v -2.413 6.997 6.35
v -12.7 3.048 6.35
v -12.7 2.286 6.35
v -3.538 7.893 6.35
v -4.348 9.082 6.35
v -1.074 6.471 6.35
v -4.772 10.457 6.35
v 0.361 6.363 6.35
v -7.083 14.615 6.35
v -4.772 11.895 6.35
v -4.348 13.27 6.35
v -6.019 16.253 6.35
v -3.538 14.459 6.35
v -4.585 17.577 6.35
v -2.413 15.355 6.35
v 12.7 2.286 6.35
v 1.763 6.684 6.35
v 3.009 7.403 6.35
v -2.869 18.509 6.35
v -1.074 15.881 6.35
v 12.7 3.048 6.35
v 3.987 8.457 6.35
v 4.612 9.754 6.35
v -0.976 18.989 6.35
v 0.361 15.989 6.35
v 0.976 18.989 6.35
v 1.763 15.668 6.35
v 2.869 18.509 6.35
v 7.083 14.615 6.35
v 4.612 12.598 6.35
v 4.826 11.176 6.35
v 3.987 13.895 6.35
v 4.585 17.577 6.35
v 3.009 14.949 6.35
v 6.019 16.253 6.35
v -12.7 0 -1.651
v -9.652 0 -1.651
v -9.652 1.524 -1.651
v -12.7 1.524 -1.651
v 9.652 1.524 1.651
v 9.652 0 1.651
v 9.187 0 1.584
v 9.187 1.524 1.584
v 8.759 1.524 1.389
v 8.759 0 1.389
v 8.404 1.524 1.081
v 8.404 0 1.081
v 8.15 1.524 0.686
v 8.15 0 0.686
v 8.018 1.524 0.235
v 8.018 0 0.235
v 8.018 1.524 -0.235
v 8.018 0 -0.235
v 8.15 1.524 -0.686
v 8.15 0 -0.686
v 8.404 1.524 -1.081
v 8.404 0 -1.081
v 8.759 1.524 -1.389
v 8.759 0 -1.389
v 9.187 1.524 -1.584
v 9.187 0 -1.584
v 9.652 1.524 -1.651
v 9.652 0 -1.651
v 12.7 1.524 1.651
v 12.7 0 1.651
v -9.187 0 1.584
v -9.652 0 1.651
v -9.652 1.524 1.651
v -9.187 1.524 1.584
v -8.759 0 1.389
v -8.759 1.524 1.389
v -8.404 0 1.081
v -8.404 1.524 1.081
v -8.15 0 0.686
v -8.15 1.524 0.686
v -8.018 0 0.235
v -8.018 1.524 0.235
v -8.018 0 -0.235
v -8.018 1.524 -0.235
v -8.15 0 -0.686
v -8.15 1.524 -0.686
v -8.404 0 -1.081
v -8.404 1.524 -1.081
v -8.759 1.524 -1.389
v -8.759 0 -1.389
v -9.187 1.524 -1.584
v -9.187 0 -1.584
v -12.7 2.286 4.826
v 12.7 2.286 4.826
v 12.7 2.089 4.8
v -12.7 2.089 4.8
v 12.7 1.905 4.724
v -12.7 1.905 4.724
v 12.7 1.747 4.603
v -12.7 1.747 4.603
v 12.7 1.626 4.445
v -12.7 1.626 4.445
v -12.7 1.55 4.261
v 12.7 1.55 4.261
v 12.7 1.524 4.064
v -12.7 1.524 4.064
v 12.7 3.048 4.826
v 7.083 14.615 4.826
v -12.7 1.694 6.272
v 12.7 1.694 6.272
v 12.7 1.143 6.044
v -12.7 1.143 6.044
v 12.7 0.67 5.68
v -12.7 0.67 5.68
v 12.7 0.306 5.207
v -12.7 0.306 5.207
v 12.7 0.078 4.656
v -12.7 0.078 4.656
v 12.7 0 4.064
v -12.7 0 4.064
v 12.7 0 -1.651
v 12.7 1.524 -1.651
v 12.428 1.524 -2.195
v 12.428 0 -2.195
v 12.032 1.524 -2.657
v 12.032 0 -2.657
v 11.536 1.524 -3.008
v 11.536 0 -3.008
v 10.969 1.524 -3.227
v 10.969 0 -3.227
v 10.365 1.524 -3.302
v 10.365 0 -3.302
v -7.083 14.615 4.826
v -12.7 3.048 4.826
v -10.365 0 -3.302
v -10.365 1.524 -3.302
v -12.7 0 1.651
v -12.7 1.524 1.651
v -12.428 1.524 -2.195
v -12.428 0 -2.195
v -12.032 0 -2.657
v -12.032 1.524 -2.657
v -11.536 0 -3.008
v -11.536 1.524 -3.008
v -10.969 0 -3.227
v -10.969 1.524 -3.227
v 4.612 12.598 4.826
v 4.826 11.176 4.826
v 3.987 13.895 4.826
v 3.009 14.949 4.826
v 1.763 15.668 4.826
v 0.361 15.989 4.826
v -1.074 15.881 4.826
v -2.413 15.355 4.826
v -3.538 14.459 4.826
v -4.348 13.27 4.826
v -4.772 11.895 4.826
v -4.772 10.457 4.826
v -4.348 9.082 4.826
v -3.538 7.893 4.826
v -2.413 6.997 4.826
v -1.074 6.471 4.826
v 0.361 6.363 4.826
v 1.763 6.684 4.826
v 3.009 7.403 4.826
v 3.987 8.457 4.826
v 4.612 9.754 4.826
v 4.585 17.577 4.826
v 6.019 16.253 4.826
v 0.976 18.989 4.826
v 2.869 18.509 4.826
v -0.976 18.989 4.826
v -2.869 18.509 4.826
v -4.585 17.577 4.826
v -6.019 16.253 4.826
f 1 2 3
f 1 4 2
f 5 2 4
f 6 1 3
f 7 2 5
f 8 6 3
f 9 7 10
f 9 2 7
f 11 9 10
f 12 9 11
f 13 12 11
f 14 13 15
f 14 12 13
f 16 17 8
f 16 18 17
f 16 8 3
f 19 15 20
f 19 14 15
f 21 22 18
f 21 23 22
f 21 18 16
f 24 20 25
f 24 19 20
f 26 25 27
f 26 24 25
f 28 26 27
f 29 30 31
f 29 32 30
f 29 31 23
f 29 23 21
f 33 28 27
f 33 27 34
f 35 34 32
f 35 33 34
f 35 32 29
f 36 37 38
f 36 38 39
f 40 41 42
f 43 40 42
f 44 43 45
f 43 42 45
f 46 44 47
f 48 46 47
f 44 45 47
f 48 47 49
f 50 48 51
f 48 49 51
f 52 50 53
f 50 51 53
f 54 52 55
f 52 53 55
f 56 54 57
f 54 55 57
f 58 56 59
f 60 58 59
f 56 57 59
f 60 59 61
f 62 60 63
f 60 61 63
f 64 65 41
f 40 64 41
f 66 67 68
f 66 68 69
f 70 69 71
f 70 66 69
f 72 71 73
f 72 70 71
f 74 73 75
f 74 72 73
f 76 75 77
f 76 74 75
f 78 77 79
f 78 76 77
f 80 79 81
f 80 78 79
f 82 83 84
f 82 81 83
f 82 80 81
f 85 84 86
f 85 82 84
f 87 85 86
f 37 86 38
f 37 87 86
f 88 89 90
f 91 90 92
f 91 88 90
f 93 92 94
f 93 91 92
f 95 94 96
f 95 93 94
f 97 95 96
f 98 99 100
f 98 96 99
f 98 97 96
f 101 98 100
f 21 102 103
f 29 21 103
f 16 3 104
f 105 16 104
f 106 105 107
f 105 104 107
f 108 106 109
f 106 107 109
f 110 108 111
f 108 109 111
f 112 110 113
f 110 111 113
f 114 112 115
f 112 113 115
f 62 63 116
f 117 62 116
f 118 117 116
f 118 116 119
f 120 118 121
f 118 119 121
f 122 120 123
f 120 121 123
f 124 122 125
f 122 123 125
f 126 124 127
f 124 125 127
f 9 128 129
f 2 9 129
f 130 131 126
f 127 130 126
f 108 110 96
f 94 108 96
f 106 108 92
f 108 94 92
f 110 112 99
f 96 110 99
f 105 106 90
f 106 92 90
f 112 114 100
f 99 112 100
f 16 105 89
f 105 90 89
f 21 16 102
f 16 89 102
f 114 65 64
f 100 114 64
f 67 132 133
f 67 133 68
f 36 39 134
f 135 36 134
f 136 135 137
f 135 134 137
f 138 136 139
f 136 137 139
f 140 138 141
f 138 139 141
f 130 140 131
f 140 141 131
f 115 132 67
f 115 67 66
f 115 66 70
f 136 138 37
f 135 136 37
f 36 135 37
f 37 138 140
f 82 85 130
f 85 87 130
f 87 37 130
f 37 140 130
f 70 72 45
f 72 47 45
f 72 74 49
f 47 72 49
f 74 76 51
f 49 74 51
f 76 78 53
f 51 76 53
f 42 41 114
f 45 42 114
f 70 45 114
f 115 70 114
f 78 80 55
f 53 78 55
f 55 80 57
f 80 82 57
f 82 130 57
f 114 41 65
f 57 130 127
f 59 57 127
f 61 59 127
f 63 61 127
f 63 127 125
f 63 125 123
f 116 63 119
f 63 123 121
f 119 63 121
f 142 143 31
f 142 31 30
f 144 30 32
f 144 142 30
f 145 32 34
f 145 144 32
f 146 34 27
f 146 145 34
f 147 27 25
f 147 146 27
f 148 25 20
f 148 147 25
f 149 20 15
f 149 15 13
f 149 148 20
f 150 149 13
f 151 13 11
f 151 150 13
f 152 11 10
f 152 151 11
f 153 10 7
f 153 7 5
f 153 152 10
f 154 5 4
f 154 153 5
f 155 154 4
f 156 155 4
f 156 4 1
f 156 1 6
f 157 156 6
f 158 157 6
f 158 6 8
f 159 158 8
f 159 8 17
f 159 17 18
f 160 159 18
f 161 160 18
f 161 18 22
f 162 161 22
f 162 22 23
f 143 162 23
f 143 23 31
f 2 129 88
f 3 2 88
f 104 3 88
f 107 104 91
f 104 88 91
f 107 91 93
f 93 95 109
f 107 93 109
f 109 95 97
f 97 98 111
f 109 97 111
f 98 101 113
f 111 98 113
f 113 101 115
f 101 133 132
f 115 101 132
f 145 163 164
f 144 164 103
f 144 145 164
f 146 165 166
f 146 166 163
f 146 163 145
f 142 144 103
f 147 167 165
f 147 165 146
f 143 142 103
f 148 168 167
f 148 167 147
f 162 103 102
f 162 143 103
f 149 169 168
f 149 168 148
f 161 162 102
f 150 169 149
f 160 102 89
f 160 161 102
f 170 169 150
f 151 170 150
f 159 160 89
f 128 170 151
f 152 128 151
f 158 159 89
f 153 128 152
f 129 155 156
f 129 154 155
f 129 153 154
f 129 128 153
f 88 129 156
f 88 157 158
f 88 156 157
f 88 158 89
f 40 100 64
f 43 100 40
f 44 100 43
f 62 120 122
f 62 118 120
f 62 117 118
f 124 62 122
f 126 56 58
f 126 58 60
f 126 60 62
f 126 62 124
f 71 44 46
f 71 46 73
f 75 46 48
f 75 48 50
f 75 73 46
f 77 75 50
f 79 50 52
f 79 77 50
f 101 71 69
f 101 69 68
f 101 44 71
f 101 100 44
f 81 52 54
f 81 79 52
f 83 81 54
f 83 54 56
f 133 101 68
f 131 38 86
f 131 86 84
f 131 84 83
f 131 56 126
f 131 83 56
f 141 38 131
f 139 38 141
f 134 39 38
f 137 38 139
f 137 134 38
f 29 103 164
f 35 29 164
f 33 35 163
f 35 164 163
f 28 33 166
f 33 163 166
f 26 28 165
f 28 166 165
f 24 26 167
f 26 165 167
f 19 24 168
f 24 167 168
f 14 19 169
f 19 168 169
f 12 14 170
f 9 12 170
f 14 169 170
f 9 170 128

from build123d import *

# Parameters (mm, degrees)
BOSS_EXTRUDE1_DEPTH      = 6.35
BOSS_EXTRUDE1_DEPTH_BACK = 3.302
SKETCH3_R                = 4.826
CUT_EXTRUDE1_DEPTH       = 24.759524406
CUT_EXTRUDE2_DEPTH       = 33.378773911
FILLET1_R                = 2.4765


with BuildPart() as part:
    # Sketch3 → Boss-Extrude1 (new, two sides: drawn at the far end of the back side and taken through both)
    with BuildSketch(Plane.XY.offset(-BOSS_EXTRUDE1_DEPTH_BACK)):
        with BuildLine():
            Line((-12.7, 0), (12.7, 0))
            Line((12.7, 0), (12.7, 3.048))
            Line((12.7, 3.048), (7.083102209, 14.615409702))
            ThreePointArc((7.083102209, 14.615409702), (0, 19.05), (-7.083102209, 14.615409702))
            Line((-7.083102209, 14.615409702), (-12.7, 3.048))
            Line((-12.7, 3.048), (-12.7, 0))
        make_face()
        with Locations((0, 11.176)):
            Circle(SKETCH3_R, mode=Mode.SUBTRACT)
    extrude(amount=BOSS_EXTRUDE1_DEPTH + BOSS_EXTRUDE1_DEPTH_BACK)

    # Sketch4 → Cut-Extrude1 (cut, through all)
    with BuildSketch(Plane(origin=(0, 0, 0), x_dir=(1, 0, 0), z_dir=(0, 1, 0))):
        with BuildLine():
            Line((-12.7, 1.651), (-12.7, -1.651))
            Line((-12.7, -1.651), (-9.652, -1.651))
            ThreePointArc((-9.652, -1.651), (-8.001, 0), (-9.652, 1.651))
            Line((-9.652, 1.651), (-12.7, 1.651))
        make_face()
        with BuildLine():
            Line((9.652, 1.651), (12.7, 1.651))
            Line((12.7, 1.651), (12.7, -1.651))
            Line((12.7, -1.651), (9.652, -1.651))
            ThreePointArc((9.652, -1.651), (8.001, 0), (9.652, 1.651))
        make_face()
    extrude(amount=CUT_EXTRUDE1_DEPTH, mode=Mode.SUBTRACT)

    # Sketch5 → Cut-Extrude2 (cut, through all)
    with BuildSketch(Plane.ZY.offset(12.7)):
        with BuildLine():
            Line((-3.302, 19.05), (4.826, 19.05))
            Line((4.826, 19.05), (4.826, 2.286))
            ThreePointArc((4.826, 2.286), (4.602815367, 1.747184633), (4.064, 1.524))
            Line((4.064, 1.524), (-3.302, 1.524))
            Line((-3.302, 1.524), (-3.302, 19.05))
        make_face()
        with BuildLine():
            Line((4.064, 0), (6.35, 0))
            Line((6.35, 0), (6.35, 2.286))
            ThreePointArc((6.35, 2.286), (5.680446102, 0.669553898), (4.064, 0))
        make_face()
    extrude(amount=-CUT_EXTRUDE2_DEPTH, mode=Mode.SUBTRACT)

    # Fillet1
    # the kernel refuses this fillet: 2.4765 mm, written as the material it takes off along each edge
    with BuildSketch(Plane(origin=(-12.7, 7.361166479, -3.302), x_dir=(1, 0, 0), z_dir=(0, -1, 0))) as fillet1_piece_1:
        with BuildLine():
            CenterArc((2.334866591, 2.4765), FILLET1_R, 199.471220634, 70.528779366)
            Line((0, 1.651), (-0.046697332, 1.63449))
            ThreePointArc((-0.046697332, 1.63449), (-0.04953, 0.8255), (-0.04953, 0))
            Line((-0.04953, 0), (0, -0.04953))
            Line((0, -0.04953), (2.334866591, -0.04953))
            Line((2.334866591, -0.04953), (2.334866591, 0))
        make_face()
    extrude(amount=13.198332957, mode=Mode.SUBTRACT)
    with BuildSketch(Plane(origin=(12.7, -5.837166479, -3.302), x_dir=(0, 0, 1), z_dir=(0, 1, 0))) as fillet1_piece_2:
        with BuildLine():
            CenterArc((2.4765, -2.334866591), FILLET1_R, 109.471220634, 70.528779366)
            Line((0, -2.334866591), (-0.04953, -2.334866591))
            Line((-0.04953, -2.334866591), (-0.04953, 0))
            Line((-0.04953, 0), (0, 0.04953))
            ThreePointArc((0, 0.04953), (0.8255, 0.04953), (1.63449, 0.046697332))
            Line((1.63449, 0.046697332), (1.651, 0))
        make_face()
    extrude(amount=13.198332957, mode=Mode.SUBTRACT)


solid = part.part
